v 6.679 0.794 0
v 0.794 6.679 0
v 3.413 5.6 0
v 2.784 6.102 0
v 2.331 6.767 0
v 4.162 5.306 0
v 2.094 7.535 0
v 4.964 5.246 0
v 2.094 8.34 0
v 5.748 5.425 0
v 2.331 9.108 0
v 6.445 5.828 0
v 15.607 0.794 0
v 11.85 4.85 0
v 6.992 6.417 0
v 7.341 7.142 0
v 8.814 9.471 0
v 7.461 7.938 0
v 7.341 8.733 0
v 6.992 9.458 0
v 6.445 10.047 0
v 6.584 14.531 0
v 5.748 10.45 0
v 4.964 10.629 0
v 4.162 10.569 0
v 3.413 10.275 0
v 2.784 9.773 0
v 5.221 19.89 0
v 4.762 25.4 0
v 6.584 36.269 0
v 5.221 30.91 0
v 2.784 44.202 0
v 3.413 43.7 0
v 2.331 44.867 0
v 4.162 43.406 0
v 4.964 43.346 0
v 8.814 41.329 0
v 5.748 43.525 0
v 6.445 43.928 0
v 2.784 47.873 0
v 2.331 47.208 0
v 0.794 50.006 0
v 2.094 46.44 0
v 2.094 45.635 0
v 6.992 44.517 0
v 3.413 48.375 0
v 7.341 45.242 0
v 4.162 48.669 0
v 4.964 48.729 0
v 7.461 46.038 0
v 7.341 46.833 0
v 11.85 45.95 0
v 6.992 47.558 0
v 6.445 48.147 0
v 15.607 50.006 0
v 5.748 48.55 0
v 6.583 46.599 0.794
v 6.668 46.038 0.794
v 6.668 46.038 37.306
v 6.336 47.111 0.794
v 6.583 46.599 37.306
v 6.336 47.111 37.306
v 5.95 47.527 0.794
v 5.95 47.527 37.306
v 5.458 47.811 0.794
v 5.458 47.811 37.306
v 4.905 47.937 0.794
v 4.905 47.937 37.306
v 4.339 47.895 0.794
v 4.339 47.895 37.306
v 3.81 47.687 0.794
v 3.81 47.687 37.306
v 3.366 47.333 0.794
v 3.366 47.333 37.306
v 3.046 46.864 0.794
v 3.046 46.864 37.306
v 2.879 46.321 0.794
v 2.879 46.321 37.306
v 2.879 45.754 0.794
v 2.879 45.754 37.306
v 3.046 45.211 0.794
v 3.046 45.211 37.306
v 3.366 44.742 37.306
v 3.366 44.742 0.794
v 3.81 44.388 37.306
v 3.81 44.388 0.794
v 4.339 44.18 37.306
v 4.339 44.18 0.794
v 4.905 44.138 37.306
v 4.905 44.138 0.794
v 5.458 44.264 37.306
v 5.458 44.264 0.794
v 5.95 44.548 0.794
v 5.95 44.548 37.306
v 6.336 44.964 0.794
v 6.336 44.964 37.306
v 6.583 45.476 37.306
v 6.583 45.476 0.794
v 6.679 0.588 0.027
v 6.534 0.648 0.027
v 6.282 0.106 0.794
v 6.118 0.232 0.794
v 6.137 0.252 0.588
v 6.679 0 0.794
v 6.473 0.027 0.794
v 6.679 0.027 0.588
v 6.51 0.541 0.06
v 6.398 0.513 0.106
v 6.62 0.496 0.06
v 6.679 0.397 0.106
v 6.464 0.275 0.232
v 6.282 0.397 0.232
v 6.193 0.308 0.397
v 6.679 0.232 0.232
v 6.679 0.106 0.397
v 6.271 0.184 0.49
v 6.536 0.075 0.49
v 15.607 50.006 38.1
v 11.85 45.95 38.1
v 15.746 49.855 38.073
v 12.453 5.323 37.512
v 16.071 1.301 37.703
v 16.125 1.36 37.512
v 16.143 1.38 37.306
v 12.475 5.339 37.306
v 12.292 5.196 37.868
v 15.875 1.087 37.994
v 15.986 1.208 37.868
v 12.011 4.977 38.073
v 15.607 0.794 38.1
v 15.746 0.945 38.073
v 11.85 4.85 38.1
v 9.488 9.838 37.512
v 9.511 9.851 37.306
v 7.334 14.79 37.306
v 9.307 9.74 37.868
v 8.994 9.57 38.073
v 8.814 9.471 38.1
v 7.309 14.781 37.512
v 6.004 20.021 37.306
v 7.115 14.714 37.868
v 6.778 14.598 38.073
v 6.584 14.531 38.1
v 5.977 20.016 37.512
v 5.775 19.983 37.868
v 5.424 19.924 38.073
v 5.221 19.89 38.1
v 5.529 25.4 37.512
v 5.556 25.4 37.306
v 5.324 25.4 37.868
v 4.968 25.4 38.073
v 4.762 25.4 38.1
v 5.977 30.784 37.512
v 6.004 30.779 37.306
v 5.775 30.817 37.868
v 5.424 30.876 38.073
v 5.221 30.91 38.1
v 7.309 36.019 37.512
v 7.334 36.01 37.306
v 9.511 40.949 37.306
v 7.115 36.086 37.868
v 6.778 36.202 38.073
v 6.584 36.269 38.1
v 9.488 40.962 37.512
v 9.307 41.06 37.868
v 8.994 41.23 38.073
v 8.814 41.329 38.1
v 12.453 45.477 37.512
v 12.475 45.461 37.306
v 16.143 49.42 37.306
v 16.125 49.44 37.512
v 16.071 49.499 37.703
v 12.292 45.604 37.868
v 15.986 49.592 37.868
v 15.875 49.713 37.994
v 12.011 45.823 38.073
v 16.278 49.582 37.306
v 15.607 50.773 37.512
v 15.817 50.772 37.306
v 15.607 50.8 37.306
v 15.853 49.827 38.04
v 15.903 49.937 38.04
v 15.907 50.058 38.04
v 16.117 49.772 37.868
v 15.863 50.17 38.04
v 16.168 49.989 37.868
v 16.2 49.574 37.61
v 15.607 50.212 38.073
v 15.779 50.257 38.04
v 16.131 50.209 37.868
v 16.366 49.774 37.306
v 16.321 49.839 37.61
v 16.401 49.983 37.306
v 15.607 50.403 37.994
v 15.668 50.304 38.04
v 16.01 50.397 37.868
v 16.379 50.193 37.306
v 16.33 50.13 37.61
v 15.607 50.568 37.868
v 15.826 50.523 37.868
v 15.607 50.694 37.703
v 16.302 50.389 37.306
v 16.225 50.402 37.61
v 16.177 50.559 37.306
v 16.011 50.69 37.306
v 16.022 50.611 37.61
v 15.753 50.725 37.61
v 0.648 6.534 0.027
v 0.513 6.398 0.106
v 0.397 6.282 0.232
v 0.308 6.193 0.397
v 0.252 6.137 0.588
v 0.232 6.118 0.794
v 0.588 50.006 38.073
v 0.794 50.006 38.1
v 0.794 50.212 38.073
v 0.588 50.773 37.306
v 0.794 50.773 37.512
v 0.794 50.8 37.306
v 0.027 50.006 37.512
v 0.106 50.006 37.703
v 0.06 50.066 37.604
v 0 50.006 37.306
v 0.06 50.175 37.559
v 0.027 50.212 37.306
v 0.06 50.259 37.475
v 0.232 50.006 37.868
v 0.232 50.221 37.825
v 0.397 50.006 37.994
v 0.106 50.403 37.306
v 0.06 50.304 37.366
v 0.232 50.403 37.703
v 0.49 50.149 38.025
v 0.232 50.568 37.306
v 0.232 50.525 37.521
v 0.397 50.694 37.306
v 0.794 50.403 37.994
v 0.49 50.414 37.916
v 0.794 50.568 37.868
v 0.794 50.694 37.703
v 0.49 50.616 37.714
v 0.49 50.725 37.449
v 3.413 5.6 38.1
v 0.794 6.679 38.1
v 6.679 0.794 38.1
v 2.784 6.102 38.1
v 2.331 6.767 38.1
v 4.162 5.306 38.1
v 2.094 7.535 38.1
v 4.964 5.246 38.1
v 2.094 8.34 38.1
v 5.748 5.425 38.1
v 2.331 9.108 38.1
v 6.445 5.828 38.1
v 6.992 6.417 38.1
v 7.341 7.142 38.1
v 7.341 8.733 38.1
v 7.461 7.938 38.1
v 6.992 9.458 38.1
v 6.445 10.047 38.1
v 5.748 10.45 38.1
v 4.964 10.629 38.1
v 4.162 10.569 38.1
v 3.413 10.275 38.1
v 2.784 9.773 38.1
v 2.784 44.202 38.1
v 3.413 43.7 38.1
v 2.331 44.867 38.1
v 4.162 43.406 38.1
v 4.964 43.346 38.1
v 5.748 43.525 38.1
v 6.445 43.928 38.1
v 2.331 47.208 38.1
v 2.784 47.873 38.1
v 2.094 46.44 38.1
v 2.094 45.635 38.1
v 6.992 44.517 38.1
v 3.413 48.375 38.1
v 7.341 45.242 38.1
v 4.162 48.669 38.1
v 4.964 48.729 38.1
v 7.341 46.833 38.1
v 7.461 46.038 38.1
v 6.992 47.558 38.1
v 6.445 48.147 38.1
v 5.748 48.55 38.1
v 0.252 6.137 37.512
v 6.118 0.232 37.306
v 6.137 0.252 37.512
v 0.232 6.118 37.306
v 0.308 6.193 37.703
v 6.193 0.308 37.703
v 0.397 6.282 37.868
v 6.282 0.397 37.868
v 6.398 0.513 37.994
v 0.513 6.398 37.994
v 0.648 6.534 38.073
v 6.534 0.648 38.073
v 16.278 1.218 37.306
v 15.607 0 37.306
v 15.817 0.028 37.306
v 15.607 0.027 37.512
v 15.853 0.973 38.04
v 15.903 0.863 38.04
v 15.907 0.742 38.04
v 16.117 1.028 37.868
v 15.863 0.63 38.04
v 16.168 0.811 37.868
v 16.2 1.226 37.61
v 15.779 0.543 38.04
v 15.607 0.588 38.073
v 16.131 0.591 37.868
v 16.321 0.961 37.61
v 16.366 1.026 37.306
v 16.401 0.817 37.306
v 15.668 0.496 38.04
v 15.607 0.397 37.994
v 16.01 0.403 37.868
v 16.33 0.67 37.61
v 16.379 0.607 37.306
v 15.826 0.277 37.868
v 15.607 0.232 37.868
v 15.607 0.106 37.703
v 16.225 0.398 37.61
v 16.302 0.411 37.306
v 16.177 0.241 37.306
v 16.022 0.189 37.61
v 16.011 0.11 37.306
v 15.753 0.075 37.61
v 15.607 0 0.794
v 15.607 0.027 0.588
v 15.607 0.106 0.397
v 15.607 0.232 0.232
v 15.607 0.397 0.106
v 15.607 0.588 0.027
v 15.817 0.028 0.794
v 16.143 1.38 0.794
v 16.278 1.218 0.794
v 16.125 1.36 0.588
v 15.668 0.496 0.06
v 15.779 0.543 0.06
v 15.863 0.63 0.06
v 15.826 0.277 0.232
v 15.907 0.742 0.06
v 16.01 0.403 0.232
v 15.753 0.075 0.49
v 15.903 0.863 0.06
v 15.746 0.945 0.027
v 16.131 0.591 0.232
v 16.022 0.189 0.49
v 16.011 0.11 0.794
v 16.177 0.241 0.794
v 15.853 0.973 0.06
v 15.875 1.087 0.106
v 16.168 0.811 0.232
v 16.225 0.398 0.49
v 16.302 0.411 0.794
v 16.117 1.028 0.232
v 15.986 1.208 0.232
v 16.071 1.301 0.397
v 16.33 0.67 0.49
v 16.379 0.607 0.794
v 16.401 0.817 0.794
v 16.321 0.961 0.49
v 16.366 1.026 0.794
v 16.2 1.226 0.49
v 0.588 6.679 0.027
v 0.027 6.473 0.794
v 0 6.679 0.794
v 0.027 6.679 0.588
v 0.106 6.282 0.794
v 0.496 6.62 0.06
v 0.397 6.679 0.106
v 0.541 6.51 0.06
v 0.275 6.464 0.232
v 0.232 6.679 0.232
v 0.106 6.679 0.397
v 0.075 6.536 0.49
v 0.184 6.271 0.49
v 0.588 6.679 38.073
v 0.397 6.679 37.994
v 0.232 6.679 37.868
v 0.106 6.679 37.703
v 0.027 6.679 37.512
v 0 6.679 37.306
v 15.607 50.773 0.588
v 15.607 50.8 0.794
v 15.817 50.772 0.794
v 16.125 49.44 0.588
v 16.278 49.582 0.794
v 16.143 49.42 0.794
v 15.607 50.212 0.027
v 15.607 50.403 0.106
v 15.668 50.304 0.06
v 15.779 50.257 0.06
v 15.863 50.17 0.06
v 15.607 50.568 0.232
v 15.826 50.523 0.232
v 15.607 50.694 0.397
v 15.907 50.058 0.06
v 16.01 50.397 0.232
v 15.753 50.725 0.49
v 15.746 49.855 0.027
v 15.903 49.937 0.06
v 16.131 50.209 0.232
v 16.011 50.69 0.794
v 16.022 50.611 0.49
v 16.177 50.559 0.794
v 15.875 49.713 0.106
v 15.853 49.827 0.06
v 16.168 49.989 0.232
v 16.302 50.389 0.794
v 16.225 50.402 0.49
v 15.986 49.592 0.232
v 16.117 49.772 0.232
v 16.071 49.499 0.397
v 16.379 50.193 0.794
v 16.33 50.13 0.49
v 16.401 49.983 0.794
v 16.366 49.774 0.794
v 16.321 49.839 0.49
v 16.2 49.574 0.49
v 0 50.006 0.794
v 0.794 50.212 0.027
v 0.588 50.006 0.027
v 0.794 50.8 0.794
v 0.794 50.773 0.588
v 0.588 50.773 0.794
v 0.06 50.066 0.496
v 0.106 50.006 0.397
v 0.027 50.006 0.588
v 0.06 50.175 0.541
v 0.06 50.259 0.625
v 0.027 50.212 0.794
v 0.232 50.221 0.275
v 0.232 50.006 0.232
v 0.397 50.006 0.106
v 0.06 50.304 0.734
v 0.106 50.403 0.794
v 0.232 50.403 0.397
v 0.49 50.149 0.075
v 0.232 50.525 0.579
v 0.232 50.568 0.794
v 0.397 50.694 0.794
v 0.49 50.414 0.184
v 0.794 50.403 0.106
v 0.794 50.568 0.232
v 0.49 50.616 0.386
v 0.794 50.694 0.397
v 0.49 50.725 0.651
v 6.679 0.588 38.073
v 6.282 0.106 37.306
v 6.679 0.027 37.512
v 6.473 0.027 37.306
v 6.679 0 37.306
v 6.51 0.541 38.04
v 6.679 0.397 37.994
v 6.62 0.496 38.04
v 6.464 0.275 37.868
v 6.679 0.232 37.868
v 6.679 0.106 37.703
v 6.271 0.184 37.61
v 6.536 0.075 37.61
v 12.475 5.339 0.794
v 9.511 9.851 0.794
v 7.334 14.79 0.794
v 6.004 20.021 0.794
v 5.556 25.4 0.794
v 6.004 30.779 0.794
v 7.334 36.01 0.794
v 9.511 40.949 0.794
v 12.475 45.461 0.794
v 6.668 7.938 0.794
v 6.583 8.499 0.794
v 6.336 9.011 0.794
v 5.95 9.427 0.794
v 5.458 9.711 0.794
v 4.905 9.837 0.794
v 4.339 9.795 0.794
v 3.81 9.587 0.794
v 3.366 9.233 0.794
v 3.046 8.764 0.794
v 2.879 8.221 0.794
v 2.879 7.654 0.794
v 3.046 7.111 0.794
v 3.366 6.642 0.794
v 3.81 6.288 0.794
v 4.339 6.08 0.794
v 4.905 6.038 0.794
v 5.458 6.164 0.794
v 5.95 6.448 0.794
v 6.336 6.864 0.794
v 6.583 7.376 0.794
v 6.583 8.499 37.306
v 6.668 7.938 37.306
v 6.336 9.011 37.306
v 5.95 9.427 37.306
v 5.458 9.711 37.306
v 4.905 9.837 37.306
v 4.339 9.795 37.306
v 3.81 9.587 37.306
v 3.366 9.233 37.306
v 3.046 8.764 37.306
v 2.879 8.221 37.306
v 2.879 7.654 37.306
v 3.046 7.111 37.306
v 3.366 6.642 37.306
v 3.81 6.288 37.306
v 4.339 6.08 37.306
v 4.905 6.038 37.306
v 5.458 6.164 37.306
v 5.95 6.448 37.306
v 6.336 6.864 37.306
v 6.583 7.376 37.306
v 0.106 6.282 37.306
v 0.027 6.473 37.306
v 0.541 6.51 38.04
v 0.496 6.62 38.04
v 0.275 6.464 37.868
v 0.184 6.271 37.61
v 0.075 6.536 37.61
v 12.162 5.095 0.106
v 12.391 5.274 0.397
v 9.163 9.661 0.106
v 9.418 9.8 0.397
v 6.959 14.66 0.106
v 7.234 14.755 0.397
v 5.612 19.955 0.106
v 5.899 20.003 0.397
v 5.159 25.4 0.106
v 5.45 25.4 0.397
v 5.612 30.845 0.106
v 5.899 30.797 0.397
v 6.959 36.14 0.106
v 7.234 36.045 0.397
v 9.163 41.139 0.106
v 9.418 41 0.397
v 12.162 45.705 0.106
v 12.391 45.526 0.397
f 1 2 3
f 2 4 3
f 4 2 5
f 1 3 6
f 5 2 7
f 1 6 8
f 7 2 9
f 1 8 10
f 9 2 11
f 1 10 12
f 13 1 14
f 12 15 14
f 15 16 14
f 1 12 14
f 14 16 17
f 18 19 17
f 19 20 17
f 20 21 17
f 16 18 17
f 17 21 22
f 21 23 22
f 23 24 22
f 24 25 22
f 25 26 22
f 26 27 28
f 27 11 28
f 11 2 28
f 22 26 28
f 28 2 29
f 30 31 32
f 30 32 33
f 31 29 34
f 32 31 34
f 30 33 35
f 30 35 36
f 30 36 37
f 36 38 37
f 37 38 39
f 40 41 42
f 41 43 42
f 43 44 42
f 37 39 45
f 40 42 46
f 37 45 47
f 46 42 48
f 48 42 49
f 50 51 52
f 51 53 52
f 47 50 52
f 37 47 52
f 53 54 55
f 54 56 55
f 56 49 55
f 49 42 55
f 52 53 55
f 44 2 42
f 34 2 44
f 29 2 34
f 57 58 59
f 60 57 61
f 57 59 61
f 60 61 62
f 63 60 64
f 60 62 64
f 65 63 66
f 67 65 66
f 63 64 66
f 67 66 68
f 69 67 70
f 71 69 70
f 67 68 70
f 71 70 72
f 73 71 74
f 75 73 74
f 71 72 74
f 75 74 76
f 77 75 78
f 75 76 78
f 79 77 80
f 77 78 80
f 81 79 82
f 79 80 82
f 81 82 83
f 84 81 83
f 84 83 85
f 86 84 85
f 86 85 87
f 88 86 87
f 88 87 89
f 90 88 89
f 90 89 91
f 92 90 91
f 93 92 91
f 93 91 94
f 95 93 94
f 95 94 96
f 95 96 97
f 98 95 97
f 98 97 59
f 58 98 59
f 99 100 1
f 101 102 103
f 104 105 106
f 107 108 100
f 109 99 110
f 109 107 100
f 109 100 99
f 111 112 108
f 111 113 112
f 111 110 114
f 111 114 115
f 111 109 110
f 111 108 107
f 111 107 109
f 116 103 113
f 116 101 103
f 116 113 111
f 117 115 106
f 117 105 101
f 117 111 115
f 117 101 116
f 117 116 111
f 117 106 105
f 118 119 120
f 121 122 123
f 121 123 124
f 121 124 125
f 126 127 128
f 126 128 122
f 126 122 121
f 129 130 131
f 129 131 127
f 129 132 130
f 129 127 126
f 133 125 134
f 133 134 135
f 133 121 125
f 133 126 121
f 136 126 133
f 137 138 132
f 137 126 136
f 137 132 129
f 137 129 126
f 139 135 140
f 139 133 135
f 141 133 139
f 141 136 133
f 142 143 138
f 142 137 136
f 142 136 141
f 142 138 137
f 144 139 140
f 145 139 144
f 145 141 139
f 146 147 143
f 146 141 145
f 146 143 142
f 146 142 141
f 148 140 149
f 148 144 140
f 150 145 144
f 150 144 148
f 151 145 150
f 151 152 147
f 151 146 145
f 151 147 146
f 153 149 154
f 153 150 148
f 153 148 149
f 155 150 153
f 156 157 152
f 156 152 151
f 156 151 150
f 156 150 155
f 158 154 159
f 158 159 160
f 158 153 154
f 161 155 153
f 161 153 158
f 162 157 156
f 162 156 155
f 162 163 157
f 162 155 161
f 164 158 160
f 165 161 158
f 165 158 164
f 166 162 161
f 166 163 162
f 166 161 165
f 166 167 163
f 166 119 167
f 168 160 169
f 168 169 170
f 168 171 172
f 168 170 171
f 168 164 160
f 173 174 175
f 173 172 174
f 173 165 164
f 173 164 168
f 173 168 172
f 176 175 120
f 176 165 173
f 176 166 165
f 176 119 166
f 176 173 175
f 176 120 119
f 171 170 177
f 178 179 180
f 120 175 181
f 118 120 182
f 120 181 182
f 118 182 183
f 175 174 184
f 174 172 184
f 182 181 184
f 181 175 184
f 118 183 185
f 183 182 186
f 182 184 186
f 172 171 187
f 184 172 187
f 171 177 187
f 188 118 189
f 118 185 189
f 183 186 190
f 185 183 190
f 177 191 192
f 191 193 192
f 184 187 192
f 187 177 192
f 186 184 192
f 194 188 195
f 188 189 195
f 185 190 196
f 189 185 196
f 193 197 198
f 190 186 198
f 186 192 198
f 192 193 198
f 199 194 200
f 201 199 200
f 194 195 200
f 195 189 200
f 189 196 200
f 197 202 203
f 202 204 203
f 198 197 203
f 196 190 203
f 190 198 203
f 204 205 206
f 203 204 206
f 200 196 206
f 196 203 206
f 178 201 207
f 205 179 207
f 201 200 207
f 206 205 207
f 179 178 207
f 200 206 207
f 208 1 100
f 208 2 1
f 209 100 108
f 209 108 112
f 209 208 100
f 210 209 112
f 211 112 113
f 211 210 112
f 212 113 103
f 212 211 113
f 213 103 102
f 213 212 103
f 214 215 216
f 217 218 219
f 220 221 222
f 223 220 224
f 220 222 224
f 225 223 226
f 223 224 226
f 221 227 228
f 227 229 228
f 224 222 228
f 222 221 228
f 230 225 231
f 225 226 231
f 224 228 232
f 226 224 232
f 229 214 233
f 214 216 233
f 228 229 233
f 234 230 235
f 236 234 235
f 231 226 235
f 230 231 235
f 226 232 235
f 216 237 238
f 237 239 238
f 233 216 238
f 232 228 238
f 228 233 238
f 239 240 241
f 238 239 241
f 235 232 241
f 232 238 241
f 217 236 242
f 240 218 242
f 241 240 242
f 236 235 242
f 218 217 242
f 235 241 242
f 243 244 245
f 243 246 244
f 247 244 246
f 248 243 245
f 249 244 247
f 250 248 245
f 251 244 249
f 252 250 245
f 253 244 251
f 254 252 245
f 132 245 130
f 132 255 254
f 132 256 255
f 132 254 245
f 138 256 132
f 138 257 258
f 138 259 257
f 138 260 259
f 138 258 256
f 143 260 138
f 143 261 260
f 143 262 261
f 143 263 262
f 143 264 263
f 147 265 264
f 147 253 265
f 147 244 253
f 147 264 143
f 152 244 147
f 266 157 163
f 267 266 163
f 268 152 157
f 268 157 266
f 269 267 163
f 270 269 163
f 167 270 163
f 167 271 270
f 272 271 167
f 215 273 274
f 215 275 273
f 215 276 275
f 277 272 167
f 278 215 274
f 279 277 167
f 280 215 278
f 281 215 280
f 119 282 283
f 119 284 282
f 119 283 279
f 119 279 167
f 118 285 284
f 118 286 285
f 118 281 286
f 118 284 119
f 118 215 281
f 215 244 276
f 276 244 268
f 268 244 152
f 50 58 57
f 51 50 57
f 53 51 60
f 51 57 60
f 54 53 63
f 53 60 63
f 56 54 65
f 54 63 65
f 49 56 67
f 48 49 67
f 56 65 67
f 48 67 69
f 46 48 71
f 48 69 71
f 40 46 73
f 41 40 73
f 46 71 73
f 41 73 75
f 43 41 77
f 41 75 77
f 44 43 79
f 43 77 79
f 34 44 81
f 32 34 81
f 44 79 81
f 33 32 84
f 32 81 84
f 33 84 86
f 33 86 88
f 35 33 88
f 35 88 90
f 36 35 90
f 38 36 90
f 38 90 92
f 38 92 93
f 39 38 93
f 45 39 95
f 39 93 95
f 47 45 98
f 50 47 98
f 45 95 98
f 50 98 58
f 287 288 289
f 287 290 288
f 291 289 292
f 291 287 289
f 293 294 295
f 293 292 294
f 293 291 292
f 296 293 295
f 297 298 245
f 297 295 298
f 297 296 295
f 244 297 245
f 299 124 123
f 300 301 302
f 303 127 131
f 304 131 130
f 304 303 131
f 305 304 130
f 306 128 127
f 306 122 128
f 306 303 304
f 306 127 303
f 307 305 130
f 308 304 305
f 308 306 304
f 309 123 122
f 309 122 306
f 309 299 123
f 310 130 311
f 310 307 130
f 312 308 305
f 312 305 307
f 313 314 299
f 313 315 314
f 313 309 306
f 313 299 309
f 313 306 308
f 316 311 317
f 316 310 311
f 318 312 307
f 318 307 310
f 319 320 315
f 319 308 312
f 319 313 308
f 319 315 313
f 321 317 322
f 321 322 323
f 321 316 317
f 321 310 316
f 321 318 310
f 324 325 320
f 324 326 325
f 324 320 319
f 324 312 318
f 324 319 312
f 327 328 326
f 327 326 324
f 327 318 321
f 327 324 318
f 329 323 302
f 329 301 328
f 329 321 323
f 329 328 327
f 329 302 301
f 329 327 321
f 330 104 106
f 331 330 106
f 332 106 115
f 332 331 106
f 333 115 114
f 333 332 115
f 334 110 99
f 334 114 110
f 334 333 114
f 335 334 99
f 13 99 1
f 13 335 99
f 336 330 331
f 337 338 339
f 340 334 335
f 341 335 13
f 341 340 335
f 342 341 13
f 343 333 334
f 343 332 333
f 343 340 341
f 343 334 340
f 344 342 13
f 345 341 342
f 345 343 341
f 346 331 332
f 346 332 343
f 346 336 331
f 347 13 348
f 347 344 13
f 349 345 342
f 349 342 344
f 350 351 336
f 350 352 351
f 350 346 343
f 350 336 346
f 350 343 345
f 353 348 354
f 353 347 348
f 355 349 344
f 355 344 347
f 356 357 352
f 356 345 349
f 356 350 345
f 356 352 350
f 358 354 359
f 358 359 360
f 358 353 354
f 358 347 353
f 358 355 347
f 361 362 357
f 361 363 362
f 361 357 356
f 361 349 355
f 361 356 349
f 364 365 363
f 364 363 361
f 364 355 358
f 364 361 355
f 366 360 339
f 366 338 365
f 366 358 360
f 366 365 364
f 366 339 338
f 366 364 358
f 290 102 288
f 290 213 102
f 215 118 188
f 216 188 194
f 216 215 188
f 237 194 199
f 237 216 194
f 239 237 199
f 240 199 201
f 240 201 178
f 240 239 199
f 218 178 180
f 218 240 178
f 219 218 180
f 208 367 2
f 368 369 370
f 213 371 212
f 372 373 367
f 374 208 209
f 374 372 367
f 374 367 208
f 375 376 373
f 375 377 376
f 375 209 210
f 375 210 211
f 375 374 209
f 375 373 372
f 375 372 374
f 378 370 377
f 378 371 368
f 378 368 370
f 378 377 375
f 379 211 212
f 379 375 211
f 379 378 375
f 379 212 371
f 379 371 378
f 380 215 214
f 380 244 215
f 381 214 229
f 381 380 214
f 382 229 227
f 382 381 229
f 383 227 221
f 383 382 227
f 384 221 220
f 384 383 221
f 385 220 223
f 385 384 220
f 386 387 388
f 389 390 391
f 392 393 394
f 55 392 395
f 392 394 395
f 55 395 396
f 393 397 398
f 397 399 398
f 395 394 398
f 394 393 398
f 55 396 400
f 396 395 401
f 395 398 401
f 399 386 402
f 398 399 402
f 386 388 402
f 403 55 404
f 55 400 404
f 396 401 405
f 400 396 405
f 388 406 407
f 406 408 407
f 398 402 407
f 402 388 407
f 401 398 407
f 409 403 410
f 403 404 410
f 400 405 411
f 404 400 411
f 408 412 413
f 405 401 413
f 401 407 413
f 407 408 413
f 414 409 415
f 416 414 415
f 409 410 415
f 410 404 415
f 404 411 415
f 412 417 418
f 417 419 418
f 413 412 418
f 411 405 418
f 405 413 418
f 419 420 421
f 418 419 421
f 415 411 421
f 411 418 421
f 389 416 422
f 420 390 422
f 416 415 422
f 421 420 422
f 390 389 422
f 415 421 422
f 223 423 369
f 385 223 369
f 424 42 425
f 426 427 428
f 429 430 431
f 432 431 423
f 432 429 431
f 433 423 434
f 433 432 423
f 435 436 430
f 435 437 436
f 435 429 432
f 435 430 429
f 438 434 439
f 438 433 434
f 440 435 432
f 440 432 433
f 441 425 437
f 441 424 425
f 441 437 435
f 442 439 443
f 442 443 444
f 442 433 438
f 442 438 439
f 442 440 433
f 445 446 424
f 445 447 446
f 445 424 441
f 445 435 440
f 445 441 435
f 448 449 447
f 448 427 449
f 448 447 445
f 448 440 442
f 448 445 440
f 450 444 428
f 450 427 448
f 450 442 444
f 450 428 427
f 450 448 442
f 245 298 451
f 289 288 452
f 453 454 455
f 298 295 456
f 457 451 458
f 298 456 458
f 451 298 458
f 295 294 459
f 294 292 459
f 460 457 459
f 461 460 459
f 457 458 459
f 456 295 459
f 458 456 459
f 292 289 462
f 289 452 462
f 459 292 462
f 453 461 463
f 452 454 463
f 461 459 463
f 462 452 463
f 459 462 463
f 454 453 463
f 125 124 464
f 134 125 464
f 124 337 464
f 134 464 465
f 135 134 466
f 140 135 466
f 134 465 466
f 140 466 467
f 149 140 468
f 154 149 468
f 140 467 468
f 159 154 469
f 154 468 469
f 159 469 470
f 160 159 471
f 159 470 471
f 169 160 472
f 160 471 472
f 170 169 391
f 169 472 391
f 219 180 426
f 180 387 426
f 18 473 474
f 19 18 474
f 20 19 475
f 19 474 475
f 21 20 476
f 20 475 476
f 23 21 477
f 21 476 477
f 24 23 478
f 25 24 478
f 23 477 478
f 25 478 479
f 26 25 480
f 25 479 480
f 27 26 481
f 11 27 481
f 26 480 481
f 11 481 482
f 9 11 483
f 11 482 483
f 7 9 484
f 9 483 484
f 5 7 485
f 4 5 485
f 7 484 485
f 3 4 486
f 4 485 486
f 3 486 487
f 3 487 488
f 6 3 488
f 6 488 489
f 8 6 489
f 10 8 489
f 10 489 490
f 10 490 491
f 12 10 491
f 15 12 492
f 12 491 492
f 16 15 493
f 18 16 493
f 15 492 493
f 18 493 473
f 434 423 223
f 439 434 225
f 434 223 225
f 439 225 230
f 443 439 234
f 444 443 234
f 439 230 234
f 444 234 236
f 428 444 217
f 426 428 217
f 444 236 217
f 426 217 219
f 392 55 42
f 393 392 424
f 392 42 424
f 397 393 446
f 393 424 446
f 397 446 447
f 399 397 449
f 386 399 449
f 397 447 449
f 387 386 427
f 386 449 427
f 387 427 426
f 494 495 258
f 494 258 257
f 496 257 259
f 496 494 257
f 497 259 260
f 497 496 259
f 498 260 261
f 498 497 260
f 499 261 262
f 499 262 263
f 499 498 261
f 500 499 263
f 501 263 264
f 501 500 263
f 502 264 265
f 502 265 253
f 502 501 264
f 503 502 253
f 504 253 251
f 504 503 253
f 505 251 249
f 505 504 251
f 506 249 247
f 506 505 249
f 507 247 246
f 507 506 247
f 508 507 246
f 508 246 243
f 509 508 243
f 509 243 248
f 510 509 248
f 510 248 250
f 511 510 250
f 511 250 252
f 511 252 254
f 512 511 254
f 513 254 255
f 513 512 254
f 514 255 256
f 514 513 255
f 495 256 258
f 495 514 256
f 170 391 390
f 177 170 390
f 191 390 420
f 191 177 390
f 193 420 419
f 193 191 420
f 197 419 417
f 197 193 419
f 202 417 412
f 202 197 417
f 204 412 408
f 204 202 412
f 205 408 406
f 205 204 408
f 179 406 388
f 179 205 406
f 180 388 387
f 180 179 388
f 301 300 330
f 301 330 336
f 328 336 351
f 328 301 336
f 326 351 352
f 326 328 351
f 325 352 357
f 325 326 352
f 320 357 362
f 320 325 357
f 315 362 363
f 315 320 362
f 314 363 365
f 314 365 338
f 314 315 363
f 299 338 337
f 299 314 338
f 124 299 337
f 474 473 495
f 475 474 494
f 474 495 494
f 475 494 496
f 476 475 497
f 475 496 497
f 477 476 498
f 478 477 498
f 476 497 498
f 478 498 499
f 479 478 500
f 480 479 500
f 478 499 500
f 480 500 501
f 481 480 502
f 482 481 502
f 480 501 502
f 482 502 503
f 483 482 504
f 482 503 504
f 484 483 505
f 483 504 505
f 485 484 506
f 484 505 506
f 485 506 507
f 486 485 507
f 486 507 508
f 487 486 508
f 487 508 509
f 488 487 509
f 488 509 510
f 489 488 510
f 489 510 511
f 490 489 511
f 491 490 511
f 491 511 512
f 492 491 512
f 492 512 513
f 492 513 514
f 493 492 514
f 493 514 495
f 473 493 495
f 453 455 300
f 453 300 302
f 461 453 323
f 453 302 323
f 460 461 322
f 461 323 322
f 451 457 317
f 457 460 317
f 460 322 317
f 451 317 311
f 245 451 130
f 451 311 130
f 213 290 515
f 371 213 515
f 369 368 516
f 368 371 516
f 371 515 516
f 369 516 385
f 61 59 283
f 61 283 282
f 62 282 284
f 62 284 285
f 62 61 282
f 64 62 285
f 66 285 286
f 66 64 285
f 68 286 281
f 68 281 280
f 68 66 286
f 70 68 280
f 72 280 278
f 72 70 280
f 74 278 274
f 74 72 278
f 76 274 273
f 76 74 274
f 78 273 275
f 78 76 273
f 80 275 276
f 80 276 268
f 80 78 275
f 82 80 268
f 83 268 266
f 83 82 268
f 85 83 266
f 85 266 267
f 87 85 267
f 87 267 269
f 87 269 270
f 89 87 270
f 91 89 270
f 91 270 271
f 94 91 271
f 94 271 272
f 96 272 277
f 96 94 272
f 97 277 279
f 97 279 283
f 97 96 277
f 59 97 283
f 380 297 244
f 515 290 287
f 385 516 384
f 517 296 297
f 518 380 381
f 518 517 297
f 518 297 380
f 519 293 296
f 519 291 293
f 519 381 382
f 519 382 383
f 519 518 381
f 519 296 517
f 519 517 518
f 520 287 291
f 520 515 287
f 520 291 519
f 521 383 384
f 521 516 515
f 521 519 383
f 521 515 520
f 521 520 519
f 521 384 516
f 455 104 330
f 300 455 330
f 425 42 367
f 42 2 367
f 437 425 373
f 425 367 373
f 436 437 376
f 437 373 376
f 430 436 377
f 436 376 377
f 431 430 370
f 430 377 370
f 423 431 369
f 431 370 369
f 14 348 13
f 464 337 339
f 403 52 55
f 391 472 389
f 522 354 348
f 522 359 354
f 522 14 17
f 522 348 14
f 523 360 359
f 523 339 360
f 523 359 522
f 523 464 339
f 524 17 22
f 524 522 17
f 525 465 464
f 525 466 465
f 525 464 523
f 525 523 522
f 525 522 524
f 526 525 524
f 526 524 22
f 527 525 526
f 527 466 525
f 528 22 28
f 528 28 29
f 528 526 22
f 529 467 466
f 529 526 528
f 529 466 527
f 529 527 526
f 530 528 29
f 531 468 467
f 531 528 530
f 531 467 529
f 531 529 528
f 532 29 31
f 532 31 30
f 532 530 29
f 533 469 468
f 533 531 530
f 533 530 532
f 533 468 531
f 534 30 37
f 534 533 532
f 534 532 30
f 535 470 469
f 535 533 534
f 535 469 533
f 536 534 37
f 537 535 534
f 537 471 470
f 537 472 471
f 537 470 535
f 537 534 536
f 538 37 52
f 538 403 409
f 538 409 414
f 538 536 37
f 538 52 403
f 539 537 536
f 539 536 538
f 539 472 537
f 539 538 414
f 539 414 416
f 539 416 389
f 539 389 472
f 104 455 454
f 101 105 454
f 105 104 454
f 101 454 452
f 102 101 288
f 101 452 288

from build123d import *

# Parameters (mm, degrees)
BOSS_EXTRUDE1_DEPTH = 38.1
SKETCH2_R           = 1.905
CUT_EXTRUDE1_DEPTH  = 66.935388863
CHAMFER1_SIZE       = 6.35
FILLET1_R           = 0.79375
CHAMFER2_SIZE       = 0.79375


with BuildPart() as part:
    # Sketch1 → Boss-Extrude1 (new body)
    with BuildSketch(Plane.XY):
        with BuildLine():
            Line((0, 0), (17.754591081, 0))
            ThreePointArc((17.754591081, 0), (5.55625, 25.4), (17.754591081, 50.8))
            Line((17.754591081, 50.8), (0, 50.8))
            Line((0, 50.8), (0, 0))
        make_face()
    extrude(amount=BOSS_EXTRUDE1_DEPTH)

    # Sketch2 → Cut-Extrude1 (cut, through all)
    with BuildSketch(Plane.XY.offset(38.1)):
        with Locations((4.7625, 46.0375)):
            Circle(SKETCH2_R)
        with Locations((4.7625, 7.9375)):
            Circle(SKETCH2_R)
    extrude(amount=-CUT_EXTRUDE1_DEPTH, mode=Mode.SUBTRACT)

    # Chamfer1
    chamfer1_edges = [part.edges().sort_by_distance(p)[0] for p in [
        (0, 0, 19.05),
    ]]
    chamfer(chamfer1_edges, length=CHAMFER1_SIZE)

    # Fillet1
    fillet1_edges = [part.edges().sort_by_distance(p)[0] for p in [
        (5.55625, 25.4, 38.1),
        (8.877295541, 50.8, 38.1),
        (12.052295541, 0, 0),
        (12.052295541, 0, 38.1),
        (6.35, 0, 19.05),
        (3.175, 3.175, 0),
        (0, 6.35, 19.05),
        (3.175, 3.175, 38.1),
        (0, 28.575, 38.1),
        (8.877295541, 50.8, 0),
        (5.55625, 25.4, 0),
        (0, 28.575, 0),
        (0, 50.8, 19.05),
        (17.754591081, 50.8, 19.05),
        (17.754591081, 0, 19.05),
    ]]
    fillet(fillet1_edges, radius=FILLET1_R)

    # Chamfer2
    chamfer2_edges = [part.edges().sort_by_distance(p)[0] for p in [
        (2.8575, 46.0375, 0),
        (2.8575, 46.0375, 38.1),
        (2.8575, 7.9375, 0),
        (2.8575, 7.9375, 38.1),
    ]]
    chamfer(chamfer2_edges, length=CHAMFER2_SIZE)


solid = part.part
